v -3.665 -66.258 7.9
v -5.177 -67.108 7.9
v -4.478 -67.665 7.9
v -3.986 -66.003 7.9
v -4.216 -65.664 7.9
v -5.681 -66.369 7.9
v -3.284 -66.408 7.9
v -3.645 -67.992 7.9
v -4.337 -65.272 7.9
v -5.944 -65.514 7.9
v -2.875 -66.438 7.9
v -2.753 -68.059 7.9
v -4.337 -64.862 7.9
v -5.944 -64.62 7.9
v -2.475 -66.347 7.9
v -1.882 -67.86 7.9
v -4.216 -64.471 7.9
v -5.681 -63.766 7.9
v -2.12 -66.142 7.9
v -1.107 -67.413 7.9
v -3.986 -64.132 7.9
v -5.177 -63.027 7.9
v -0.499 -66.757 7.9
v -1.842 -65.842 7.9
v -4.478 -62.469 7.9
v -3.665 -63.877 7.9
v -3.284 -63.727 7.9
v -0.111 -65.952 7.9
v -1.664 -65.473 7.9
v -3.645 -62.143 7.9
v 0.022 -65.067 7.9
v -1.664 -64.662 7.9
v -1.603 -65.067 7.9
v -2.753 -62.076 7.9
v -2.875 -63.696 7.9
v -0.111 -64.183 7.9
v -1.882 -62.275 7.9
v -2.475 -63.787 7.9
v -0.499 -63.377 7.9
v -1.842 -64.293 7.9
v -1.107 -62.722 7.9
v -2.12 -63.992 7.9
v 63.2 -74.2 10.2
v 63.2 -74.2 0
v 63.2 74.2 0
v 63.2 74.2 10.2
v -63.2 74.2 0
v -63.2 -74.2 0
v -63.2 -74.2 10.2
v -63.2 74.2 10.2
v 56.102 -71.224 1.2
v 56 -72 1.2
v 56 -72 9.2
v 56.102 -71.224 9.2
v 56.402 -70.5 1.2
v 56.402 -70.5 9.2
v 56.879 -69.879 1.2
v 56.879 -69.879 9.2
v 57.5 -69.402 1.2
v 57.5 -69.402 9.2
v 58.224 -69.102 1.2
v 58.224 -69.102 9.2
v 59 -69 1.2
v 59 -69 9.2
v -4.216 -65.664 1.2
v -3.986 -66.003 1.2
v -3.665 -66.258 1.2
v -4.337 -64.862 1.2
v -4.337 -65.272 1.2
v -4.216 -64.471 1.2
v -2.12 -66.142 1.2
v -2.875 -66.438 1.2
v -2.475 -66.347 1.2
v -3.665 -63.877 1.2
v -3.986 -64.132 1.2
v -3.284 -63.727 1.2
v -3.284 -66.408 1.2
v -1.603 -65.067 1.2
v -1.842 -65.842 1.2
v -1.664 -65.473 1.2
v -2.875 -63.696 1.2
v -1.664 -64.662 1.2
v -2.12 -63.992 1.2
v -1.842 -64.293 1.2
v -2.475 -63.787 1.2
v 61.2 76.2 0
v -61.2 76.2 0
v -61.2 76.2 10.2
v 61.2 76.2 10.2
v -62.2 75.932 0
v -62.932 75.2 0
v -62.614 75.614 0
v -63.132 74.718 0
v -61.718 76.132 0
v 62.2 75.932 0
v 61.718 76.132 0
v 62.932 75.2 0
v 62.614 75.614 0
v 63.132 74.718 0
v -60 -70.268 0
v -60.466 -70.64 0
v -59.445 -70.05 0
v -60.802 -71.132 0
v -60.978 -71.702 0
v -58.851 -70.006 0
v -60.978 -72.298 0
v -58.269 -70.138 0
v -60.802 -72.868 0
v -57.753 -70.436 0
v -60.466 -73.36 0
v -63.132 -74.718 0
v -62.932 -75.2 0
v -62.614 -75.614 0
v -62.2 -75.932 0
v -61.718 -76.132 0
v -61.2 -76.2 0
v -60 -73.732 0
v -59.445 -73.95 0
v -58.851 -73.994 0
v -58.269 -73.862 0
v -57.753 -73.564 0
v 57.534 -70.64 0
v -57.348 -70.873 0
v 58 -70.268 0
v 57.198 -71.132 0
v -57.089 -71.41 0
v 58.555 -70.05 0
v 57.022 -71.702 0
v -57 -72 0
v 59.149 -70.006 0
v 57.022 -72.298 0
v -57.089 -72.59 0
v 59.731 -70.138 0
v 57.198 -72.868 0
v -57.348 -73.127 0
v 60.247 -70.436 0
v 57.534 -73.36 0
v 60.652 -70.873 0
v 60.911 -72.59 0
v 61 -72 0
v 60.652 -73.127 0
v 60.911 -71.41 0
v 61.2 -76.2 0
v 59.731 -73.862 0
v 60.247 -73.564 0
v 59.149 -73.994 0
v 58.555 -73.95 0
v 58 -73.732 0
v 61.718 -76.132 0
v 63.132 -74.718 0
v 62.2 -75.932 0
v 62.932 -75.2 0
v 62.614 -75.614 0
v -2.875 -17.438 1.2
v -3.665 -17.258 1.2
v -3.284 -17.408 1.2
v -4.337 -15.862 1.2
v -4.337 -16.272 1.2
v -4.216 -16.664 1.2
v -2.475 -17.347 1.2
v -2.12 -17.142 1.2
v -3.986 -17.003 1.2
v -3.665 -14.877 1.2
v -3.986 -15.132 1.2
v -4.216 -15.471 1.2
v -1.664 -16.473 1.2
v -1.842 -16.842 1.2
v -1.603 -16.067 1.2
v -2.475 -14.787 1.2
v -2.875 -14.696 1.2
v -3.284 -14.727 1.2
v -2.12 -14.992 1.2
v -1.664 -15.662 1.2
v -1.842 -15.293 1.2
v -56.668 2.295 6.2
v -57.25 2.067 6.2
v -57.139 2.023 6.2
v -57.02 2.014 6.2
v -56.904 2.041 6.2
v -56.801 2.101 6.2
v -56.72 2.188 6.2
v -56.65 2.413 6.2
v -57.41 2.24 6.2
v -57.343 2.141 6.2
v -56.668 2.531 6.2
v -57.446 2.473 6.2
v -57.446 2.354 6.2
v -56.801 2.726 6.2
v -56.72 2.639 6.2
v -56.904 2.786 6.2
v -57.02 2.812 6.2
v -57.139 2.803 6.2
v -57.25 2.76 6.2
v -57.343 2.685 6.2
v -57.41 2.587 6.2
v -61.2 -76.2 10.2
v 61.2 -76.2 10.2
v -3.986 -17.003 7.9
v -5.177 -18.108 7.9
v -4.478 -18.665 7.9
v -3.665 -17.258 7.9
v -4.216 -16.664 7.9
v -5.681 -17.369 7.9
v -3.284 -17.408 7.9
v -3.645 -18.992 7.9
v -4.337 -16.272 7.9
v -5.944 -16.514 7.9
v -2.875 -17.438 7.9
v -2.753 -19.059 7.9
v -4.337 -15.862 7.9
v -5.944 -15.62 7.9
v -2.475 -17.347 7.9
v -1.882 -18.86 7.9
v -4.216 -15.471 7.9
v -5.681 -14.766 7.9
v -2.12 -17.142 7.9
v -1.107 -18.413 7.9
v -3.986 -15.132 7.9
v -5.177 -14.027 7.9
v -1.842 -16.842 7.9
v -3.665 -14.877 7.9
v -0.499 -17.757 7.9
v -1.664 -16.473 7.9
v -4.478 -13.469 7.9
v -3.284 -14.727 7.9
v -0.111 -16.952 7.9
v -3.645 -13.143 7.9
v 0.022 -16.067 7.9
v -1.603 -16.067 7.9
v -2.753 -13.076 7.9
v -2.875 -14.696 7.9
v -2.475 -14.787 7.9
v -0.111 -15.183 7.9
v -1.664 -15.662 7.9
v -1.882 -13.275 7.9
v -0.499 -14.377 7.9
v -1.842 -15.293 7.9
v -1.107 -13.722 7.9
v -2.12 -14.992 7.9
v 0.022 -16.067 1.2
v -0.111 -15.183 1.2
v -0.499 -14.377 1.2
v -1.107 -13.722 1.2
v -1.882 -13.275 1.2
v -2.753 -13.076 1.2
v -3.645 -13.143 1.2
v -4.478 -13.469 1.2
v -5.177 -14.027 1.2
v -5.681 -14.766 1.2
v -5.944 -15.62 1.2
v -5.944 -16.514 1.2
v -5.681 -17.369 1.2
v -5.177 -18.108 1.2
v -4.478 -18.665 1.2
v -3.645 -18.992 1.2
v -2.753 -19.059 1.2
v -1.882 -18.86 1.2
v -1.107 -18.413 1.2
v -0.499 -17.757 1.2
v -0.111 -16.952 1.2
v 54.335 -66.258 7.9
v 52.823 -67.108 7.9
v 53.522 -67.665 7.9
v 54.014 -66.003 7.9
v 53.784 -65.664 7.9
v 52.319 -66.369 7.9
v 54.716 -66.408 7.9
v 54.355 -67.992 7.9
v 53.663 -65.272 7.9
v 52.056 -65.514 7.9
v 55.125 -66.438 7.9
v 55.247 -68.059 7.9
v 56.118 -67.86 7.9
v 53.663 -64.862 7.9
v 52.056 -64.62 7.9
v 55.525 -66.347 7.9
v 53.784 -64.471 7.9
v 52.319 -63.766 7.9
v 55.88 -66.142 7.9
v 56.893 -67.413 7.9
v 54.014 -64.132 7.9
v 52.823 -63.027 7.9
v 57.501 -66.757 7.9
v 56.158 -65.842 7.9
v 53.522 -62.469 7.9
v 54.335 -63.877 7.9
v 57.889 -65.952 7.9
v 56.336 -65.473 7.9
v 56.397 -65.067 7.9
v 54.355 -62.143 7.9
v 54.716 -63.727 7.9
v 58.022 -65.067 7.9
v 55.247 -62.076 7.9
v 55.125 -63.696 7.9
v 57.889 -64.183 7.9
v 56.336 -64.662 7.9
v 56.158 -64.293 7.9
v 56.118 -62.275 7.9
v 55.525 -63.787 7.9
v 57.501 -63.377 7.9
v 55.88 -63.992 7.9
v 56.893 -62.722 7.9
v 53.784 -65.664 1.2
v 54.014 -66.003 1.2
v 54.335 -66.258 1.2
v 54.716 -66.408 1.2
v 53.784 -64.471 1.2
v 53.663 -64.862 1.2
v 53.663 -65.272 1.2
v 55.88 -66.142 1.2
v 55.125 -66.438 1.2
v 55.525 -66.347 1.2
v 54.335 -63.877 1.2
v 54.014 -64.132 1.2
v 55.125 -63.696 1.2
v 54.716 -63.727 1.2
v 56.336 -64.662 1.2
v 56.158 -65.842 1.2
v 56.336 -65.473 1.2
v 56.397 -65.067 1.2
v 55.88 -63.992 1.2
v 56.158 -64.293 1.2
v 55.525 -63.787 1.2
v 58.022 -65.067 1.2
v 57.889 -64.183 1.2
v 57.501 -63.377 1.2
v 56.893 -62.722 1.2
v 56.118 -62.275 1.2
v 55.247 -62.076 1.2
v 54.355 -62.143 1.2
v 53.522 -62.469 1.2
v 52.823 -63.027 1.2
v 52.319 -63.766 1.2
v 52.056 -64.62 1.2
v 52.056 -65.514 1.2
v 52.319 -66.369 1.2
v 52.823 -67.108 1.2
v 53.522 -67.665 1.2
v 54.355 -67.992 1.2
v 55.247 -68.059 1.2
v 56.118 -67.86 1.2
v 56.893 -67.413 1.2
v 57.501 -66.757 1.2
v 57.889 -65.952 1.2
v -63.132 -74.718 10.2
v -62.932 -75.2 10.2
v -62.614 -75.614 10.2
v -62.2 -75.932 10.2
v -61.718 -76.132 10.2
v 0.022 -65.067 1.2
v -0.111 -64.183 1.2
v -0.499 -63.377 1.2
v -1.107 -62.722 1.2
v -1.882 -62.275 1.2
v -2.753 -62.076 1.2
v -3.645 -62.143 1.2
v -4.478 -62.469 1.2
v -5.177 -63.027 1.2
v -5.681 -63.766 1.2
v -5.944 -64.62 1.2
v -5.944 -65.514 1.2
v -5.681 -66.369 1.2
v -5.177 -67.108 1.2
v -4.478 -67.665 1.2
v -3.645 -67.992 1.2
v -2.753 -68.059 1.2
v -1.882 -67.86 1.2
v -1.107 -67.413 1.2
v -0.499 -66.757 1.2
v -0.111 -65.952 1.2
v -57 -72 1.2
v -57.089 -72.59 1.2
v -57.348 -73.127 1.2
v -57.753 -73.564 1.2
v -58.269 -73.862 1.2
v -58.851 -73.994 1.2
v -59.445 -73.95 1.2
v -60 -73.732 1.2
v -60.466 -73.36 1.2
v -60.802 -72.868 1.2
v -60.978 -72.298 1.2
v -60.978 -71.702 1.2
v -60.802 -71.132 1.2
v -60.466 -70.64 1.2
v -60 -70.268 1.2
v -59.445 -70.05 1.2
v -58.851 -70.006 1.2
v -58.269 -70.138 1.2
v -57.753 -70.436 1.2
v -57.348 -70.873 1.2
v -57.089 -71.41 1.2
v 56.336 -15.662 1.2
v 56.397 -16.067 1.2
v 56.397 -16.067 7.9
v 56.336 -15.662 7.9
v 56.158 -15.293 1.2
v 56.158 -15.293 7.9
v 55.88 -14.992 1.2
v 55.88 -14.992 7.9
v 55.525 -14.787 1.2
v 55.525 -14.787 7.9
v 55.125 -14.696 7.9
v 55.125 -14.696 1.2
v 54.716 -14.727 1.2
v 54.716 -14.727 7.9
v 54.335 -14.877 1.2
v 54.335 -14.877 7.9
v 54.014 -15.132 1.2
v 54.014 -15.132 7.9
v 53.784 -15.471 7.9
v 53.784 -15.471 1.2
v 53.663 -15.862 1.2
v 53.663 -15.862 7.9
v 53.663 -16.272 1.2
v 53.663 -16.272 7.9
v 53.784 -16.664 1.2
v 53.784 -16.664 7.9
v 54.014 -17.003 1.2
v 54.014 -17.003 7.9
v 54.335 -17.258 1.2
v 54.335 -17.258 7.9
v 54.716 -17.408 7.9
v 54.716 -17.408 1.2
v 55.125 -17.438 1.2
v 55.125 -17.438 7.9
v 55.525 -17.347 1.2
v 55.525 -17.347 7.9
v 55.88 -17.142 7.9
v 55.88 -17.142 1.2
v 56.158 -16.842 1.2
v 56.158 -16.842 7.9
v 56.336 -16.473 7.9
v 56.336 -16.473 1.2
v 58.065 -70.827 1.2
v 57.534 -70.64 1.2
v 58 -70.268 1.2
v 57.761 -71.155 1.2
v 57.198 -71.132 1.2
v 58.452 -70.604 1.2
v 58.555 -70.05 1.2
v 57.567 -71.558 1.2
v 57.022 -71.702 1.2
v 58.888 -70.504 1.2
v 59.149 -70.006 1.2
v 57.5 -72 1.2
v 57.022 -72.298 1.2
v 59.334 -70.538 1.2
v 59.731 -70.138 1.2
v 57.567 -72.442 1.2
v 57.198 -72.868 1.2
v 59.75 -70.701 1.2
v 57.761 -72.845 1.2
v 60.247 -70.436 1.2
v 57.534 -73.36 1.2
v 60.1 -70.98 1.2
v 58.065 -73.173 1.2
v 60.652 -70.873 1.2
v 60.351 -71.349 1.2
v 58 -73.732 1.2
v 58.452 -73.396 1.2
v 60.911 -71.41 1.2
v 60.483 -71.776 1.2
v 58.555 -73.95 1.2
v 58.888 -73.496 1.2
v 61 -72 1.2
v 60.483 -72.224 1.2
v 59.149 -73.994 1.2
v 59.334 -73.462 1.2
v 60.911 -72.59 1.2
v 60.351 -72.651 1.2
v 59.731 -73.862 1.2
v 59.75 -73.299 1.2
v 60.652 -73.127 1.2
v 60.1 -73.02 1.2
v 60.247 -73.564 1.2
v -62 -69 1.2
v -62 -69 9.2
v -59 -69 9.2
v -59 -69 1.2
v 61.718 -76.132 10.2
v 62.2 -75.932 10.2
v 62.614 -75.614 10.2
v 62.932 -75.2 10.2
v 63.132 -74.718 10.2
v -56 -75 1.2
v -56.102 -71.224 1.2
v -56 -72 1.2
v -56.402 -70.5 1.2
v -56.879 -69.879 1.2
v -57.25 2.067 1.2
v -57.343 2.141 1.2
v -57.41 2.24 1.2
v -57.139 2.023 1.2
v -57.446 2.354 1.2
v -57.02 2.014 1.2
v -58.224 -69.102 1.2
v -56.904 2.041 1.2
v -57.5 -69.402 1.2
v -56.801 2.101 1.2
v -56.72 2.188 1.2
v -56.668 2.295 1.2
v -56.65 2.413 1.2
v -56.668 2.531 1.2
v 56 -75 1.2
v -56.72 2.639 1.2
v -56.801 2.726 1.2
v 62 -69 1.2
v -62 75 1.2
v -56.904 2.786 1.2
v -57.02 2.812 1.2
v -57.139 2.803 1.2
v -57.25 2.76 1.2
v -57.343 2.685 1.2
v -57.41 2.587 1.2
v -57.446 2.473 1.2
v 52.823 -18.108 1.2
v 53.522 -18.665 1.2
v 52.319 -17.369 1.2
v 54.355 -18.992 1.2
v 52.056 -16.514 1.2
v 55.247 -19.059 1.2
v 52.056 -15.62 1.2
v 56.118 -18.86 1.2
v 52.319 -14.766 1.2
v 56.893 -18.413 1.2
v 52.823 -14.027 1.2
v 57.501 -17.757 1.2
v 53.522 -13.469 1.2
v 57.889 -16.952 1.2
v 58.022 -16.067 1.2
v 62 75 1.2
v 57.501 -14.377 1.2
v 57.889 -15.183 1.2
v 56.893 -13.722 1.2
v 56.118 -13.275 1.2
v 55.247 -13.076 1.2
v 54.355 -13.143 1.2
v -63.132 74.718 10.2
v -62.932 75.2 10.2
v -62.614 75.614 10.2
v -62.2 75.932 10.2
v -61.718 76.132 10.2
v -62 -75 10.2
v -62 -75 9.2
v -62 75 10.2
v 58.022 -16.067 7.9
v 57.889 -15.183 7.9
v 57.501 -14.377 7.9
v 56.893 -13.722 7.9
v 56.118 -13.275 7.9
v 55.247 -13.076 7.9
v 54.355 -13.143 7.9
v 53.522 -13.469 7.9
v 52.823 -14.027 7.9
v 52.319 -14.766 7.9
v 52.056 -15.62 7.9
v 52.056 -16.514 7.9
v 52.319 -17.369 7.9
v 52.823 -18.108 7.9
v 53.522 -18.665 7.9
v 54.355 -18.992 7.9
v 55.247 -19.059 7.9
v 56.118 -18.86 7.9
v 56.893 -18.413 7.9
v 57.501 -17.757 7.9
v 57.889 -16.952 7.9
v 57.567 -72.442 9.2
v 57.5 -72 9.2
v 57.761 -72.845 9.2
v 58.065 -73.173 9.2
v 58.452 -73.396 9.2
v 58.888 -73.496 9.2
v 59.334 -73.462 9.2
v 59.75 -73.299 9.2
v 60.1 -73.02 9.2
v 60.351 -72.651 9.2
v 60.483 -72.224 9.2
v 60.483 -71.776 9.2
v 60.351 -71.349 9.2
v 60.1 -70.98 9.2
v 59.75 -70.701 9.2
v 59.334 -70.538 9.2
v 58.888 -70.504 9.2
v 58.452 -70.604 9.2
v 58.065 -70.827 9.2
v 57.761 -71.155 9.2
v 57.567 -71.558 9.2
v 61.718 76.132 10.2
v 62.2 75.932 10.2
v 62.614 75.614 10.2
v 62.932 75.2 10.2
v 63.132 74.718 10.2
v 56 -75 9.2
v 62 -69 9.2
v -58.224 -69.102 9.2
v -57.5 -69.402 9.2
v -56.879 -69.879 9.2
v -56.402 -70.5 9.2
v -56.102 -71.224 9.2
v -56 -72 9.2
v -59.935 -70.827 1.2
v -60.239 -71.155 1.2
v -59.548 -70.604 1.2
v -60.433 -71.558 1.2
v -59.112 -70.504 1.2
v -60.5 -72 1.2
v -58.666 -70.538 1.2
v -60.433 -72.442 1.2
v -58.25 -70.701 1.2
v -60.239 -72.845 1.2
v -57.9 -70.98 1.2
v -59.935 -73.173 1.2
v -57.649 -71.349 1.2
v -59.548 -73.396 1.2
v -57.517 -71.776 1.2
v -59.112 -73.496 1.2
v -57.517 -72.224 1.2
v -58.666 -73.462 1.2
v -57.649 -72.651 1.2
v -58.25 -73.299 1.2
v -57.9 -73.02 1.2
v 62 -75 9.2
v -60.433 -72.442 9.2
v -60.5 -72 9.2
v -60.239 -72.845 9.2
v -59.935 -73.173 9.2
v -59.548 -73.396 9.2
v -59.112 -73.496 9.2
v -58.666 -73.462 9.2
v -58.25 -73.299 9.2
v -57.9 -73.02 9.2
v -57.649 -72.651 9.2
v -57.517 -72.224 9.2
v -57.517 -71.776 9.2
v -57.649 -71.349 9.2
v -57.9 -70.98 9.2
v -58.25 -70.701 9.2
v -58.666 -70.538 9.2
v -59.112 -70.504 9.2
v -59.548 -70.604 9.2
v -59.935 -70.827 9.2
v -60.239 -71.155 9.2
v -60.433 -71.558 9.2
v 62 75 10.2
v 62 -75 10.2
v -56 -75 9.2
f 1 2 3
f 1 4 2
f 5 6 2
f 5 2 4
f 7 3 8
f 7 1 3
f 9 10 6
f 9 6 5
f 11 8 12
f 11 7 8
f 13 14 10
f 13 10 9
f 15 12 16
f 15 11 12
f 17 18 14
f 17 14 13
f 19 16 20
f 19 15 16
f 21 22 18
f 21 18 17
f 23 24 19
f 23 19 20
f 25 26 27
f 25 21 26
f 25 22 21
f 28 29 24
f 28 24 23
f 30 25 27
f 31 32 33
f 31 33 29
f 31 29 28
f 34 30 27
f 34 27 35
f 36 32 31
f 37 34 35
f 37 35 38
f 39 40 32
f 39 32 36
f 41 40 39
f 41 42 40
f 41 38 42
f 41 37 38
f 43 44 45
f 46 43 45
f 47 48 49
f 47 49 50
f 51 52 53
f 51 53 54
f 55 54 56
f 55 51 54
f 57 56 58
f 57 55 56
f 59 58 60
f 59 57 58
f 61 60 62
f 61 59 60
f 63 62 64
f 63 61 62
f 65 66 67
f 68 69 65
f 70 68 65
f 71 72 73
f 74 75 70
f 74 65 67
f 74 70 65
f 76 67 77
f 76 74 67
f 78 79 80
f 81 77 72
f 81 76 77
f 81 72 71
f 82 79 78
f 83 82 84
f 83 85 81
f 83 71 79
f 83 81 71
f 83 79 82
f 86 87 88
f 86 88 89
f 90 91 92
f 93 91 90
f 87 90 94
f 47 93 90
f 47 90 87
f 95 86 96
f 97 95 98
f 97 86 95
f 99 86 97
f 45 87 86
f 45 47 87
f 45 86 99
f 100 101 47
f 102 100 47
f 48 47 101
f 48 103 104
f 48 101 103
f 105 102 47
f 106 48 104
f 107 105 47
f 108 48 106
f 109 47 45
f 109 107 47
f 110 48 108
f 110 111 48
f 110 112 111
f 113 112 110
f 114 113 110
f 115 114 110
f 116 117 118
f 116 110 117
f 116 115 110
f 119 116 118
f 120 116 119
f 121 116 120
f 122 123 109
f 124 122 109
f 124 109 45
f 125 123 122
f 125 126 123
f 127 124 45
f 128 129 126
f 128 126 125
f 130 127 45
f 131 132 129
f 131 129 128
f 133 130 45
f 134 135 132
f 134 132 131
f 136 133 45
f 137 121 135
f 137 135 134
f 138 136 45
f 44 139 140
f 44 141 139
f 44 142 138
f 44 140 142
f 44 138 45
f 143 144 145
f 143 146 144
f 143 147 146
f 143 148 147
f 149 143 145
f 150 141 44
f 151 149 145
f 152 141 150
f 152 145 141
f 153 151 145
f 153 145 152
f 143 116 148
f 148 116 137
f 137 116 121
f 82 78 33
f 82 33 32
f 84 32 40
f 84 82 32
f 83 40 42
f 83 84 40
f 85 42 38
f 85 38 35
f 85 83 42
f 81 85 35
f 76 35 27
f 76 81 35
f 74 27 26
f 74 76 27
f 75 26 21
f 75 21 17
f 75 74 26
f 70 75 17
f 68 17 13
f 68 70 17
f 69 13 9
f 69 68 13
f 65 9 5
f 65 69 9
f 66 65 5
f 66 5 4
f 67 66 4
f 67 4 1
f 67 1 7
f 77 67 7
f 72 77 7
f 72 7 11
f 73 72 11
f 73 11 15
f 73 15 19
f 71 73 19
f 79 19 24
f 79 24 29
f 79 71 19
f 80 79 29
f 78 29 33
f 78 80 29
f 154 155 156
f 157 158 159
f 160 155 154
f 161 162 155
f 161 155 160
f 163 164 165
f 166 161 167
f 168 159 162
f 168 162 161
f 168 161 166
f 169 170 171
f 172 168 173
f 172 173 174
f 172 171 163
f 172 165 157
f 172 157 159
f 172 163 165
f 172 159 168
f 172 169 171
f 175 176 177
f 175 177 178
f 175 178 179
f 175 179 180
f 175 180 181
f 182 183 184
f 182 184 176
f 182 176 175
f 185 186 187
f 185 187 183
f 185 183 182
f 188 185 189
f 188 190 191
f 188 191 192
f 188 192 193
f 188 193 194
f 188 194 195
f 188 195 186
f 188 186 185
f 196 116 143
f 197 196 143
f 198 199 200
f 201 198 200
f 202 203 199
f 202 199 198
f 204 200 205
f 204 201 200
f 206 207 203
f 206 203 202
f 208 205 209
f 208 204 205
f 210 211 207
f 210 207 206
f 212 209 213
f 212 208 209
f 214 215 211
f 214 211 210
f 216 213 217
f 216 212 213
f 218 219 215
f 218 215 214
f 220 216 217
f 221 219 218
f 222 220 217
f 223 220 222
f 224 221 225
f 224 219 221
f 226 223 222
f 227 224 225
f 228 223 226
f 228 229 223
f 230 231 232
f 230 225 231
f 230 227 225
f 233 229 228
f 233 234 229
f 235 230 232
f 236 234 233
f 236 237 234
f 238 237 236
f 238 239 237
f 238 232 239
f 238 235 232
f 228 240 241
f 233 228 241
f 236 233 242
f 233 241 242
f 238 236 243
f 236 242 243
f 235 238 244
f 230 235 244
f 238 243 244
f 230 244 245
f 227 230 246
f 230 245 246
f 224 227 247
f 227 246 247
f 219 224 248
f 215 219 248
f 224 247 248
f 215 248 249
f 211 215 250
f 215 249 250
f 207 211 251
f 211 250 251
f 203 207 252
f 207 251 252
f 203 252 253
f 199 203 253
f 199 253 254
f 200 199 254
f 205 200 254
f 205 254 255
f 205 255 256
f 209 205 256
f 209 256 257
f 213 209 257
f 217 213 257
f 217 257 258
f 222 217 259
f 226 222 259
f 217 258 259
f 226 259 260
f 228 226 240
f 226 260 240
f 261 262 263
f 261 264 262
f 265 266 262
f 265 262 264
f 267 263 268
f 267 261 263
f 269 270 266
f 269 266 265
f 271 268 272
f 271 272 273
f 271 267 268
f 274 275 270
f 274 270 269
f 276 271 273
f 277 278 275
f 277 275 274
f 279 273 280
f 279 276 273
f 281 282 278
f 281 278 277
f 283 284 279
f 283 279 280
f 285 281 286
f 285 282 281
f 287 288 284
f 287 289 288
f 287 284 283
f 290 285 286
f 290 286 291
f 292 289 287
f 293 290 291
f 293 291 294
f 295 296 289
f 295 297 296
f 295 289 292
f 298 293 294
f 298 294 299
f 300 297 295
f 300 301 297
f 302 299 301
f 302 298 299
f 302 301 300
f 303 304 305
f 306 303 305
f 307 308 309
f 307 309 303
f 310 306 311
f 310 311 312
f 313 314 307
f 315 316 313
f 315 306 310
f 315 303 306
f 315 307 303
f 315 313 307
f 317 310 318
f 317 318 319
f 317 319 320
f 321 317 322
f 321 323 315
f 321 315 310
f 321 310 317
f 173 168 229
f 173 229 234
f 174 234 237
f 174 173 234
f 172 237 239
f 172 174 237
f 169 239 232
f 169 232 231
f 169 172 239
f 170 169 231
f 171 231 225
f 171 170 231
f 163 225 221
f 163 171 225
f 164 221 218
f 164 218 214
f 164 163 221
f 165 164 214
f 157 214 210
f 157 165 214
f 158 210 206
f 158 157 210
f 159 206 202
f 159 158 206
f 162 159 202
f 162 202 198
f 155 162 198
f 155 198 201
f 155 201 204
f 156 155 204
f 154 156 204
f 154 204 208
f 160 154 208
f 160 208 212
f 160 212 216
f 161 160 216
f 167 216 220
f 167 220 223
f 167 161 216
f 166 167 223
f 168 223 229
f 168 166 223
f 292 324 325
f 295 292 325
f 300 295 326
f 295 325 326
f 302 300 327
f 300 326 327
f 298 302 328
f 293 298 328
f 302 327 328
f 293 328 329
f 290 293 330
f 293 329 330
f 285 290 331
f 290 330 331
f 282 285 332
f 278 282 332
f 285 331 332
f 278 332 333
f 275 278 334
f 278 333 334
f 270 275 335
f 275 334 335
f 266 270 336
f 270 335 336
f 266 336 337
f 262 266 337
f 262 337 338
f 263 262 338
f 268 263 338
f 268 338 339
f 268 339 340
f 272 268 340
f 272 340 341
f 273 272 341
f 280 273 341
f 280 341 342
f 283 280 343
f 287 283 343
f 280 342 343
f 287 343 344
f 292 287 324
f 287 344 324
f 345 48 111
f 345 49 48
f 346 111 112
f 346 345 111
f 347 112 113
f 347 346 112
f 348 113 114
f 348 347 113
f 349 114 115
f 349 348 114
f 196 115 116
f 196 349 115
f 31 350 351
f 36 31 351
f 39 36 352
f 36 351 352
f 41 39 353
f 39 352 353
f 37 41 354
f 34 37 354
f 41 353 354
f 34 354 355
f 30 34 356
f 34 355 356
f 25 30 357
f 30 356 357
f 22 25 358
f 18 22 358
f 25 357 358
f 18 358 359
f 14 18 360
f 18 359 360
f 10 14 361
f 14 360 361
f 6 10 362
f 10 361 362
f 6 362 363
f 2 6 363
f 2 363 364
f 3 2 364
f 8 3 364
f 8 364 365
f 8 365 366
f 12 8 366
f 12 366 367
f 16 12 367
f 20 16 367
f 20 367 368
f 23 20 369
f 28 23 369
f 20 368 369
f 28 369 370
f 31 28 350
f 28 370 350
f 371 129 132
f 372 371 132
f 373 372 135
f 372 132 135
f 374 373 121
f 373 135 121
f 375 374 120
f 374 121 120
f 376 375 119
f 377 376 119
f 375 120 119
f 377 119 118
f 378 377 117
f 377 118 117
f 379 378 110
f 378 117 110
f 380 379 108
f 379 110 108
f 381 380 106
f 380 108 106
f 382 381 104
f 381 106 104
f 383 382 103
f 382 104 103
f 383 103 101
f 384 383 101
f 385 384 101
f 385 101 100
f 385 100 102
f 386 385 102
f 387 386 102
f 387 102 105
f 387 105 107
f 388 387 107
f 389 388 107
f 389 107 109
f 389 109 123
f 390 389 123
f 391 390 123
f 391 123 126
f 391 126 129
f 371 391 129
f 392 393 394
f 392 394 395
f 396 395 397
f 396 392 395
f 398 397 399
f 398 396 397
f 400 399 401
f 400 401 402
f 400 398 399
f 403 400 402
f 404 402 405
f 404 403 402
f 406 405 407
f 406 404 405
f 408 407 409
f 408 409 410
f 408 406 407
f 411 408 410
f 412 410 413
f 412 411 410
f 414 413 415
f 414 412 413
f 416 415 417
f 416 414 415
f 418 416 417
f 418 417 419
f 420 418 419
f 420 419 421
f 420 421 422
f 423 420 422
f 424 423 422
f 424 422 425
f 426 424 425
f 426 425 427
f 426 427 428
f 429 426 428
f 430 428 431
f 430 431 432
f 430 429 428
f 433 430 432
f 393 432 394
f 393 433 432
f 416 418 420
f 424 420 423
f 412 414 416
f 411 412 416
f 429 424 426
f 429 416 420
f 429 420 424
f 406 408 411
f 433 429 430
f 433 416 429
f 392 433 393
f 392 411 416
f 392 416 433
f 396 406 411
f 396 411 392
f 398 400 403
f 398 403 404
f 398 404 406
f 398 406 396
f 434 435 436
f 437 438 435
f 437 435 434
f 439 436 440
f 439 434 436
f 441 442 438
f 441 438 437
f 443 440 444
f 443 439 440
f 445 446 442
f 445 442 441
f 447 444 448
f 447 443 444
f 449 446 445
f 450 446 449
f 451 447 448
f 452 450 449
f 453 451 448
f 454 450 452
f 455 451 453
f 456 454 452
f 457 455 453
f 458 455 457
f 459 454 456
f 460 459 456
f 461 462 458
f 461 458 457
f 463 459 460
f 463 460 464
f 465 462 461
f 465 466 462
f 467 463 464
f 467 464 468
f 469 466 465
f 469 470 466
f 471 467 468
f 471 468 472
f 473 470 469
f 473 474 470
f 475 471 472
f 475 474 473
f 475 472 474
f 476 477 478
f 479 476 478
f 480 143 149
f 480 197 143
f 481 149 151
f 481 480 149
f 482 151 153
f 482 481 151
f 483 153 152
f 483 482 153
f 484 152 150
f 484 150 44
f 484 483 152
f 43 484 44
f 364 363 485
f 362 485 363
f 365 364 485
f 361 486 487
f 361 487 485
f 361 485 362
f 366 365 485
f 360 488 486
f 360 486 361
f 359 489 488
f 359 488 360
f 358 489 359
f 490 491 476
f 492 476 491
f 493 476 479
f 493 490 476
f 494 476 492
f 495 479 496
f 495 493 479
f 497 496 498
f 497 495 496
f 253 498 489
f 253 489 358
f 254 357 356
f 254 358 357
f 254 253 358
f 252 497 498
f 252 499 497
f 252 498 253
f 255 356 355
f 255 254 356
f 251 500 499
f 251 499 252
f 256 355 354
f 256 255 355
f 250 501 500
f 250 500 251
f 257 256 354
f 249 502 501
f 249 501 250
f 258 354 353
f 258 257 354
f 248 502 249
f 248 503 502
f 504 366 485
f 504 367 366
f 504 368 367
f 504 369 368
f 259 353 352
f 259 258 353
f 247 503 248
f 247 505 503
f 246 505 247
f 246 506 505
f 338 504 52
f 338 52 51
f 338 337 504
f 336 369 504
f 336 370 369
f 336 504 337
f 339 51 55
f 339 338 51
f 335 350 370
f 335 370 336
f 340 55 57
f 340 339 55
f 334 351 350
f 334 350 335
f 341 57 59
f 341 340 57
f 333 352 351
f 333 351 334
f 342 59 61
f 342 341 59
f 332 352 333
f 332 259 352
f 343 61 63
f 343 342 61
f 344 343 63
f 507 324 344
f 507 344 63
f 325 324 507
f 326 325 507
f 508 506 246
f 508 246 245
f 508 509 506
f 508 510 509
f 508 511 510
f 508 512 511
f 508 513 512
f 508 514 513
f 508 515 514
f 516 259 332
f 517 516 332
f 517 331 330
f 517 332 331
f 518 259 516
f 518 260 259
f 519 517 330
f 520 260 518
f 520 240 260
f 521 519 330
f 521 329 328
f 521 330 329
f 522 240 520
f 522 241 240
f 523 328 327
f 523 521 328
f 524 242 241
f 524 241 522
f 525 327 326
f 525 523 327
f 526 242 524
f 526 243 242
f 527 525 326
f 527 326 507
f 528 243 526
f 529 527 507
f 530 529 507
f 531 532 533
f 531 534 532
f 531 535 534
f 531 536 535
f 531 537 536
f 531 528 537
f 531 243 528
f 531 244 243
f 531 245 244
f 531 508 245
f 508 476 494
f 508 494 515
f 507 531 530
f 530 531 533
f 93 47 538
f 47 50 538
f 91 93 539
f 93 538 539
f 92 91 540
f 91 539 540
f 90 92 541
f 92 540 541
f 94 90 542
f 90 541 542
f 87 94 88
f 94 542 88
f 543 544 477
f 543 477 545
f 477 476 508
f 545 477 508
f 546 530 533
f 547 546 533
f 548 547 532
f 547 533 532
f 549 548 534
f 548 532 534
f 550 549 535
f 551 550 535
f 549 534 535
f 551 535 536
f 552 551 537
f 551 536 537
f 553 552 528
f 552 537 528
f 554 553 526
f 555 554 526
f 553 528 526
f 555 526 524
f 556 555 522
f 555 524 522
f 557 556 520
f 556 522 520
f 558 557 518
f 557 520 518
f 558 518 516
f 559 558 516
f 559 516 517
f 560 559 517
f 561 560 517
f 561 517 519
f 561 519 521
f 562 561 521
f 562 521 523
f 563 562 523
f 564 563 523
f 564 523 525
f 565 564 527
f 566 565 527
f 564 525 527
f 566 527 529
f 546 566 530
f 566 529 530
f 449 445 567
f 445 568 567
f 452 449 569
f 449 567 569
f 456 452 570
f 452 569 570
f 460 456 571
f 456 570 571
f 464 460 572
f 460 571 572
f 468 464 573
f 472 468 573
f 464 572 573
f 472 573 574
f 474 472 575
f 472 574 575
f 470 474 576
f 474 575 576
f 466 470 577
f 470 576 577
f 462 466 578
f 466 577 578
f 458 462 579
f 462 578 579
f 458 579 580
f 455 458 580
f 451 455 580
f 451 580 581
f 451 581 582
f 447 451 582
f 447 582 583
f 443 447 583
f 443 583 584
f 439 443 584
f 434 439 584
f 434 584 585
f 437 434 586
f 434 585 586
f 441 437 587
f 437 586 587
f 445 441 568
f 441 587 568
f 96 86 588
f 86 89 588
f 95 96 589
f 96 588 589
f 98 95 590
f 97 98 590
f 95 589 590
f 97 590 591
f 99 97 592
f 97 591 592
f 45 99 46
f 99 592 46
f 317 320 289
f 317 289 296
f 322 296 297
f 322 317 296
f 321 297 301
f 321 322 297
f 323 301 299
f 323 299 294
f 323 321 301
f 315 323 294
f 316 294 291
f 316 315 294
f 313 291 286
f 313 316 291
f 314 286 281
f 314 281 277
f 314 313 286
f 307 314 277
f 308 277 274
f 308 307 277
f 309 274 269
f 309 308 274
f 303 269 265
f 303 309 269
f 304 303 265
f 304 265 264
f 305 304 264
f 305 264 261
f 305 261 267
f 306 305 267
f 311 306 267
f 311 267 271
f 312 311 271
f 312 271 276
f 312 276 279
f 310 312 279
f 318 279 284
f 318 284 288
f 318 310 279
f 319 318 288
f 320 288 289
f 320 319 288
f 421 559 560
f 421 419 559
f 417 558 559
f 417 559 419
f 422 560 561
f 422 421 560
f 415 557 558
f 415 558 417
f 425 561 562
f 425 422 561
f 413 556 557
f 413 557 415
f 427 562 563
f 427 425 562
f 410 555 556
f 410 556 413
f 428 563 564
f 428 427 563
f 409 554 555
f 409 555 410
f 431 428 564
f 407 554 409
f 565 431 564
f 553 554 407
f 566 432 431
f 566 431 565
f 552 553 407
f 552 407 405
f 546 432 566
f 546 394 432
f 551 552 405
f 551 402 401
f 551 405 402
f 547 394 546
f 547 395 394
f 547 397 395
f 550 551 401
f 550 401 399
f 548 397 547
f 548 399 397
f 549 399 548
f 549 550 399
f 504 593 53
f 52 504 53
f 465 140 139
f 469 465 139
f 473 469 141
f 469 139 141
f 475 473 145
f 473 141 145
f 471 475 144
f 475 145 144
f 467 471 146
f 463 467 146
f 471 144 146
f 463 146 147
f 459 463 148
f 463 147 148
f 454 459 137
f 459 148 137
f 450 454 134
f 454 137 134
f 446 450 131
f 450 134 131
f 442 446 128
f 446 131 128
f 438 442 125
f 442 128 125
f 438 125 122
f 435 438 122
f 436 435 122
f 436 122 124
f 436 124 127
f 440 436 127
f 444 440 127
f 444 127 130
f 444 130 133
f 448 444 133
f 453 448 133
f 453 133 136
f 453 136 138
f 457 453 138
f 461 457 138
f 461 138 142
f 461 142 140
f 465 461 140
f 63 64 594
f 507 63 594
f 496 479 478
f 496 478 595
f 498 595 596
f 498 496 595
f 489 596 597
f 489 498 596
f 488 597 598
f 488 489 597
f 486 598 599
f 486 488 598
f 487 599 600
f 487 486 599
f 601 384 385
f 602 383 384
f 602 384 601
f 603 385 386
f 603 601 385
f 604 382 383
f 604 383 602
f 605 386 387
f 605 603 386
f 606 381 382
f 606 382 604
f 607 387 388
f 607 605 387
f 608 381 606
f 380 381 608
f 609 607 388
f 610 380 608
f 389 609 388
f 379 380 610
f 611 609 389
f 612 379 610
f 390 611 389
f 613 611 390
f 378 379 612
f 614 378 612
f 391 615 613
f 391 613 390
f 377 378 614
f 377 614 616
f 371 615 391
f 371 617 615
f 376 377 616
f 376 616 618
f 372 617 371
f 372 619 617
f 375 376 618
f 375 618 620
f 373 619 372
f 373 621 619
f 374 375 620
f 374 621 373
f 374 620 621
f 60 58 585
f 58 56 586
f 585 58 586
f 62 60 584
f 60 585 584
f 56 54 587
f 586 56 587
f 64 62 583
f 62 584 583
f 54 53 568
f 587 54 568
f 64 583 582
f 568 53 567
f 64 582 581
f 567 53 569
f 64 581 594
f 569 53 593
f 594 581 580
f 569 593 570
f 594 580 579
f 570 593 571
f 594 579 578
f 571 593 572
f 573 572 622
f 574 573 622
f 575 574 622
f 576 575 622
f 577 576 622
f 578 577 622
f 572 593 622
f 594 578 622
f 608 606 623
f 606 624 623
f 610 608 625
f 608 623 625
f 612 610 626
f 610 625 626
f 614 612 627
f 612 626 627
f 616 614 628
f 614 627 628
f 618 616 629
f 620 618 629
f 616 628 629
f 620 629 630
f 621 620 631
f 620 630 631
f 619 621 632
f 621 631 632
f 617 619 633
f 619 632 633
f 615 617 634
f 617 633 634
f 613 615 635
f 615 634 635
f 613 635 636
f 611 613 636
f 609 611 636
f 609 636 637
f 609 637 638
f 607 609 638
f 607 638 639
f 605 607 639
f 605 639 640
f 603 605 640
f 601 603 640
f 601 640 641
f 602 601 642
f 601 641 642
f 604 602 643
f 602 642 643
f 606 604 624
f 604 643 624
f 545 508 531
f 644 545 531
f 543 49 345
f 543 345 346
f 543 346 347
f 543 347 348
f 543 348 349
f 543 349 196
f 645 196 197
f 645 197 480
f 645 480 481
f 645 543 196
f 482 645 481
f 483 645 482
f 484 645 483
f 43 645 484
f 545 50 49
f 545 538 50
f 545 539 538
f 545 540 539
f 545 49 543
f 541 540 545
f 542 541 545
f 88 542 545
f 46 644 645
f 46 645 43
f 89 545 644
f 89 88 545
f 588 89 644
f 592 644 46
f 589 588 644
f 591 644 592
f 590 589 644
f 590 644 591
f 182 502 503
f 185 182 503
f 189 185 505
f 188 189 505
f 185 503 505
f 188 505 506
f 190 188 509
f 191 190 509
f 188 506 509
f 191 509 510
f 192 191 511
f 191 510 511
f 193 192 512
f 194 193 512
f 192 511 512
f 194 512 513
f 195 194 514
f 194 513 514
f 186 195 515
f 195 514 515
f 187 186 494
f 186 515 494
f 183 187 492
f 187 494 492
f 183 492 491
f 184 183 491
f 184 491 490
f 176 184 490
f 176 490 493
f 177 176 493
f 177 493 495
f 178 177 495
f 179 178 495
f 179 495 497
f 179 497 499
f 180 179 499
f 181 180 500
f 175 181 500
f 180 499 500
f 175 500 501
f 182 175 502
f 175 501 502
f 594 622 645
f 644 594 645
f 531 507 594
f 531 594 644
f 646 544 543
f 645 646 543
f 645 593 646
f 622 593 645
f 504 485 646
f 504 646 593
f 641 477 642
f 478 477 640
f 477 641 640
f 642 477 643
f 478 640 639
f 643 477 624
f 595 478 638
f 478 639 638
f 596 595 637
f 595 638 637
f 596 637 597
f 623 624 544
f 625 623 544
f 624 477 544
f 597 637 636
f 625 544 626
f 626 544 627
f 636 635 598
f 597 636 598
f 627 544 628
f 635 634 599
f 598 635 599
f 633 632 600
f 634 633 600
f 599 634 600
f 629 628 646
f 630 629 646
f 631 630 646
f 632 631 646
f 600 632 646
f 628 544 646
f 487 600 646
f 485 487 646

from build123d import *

# Parameters (mm, degrees)
F0_W           = 126.4
F0_H           = 152.4
F0_W_2         = 124
F0_H_2         = 150
F1_DEPTH       = 10.2
F2_DEPTH       = 1.2
F3_R           = 2
F4_R           = 1.5
F5_DEPTH       = 9.2
F6_D           = 3
F6_CBORE_D     = 4
F6_CBORE_DEPTH = 1.2
F7_R           = 3
F7_R_2         = 1.375
F8_DEPTH       = 6.7
F7_R_3         = 0.4
F9_DEPTH       = 5


# Not quite as in the source:
# - a feature names something its author has since deleted; it is built from what else it names


with BuildPart() as f1:
    # F0 (on Top) → F1 (new body)
    with BuildSketch(Plane.XY):
        Rectangle(F0_W, F0_H)
        Rectangle(F0_W_2, F0_H_2, mode=Mode.SUBTRACT)
    extrude(amount=F1_DEPTH)

    # F0 (on Top) → F2 (join)
    with BuildSketch(Plane.XY):
        Rectangle(F0_W_2, F0_H_2)
    extrude(amount=F2_DEPTH)

    # F3
    f3_edges = [f1.edges().sort_by_distance(p)[0] for p in [
        (63.2, -76.2, 5.1),
        (-63.2, 76.2, 5.1),
        (63.2, 76.2, 5.1),
        (-63.2, -76.2, 5.1),
    ]]
    fillet(f3_edges, radius=F3_R)

    # F4 (on face) → F5 (join)
    with BuildSketch(Plane(origin=(0, 0, 0), x_dir=(1, 0, 0), z_dir=(0, 0, -1))):
        with BuildLine():
            Line((62, 69), (62, 75))
            Line((62, 75), (56, 75))
            Line((56, 75), (56, 72))
            ThreePointArc((56, 72), (56.8786796564, 69.8786796564), (59, 69))
            Line((59, 69), (62, 69))
        make_face()
        with Locations((59, 72)):
            Circle(F4_R, mode=Mode.SUBTRACT)
        with Locations((59, 72)):
            Circle(F4_R)
        with BuildLine():
            Line((-56, 75), (-62, 75))
            Line((-62, 75), (-62, 69))
            Line((-62, 69), (-59, 69))
            ThreePointArc((-59, 69), (-56.8786796564, 69.8786796564), (-56, 72))
            Line((-56, 72), (-56, 75))
        make_face()
        with Locations((-59, 72)):
            Circle(F4_R, mode=Mode.SUBTRACT)
        with Locations((-59, 72)):
            Circle(F4_R)
    extrude(amount=-F5_DEPTH)

    # F6 (through all)
    with Locations(Plane(origin=(0, 0, 0), x_dir=(1, 0, 0), z_dir=(0, 0, -1))):
        with Locations((59, 72), (-59, 72)):
            CounterBoreHole(F6_D / 2, F6_CBORE_D / 2, F6_CBORE_DEPTH)

    # F7 (on face) → F8 (join)
    with BuildSketch(Plane.XY.offset(1.2)):
        with Locations((55.0223472919, -16.0672999918)):
            Circle(F7_R)
        with Locations((55.0223472919, -16.0672999918)):
            Circle(F7_R_2, mode=Mode.SUBTRACT)
        with Locations((-2.9776527081, -16.0672999918)):
            Circle(F7_R)
        with Locations((-2.9776527081, -16.0672999918)):
            Circle(F7_R_2, mode=Mode.SUBTRACT)
        with Locations((-2.9776527081, -65.0672999918)):
            Circle(F7_R)
        with Locations((-2.9776527081, -65.0672999918)):
            Circle(F7_R_2, mode=Mode.SUBTRACT)
        with Locations((55.0223472919, -65.0672999918)):
            Circle(F7_R)
        with Locations((55.0223472919, -65.0672999918)):
            Circle(F7_R_2, mode=Mode.SUBTRACT)
    extrude(amount=F8_DEPTH)

    # F7 (on face) → F9 (join)
    with BuildSketch(Plane.XY.offset(1.2)):
        with Locations((-57.0500735752, 2.4133773954)):
            Circle(F7_R_3)
    extrude(amount=F9_DEPTH)


solid = f1.part
